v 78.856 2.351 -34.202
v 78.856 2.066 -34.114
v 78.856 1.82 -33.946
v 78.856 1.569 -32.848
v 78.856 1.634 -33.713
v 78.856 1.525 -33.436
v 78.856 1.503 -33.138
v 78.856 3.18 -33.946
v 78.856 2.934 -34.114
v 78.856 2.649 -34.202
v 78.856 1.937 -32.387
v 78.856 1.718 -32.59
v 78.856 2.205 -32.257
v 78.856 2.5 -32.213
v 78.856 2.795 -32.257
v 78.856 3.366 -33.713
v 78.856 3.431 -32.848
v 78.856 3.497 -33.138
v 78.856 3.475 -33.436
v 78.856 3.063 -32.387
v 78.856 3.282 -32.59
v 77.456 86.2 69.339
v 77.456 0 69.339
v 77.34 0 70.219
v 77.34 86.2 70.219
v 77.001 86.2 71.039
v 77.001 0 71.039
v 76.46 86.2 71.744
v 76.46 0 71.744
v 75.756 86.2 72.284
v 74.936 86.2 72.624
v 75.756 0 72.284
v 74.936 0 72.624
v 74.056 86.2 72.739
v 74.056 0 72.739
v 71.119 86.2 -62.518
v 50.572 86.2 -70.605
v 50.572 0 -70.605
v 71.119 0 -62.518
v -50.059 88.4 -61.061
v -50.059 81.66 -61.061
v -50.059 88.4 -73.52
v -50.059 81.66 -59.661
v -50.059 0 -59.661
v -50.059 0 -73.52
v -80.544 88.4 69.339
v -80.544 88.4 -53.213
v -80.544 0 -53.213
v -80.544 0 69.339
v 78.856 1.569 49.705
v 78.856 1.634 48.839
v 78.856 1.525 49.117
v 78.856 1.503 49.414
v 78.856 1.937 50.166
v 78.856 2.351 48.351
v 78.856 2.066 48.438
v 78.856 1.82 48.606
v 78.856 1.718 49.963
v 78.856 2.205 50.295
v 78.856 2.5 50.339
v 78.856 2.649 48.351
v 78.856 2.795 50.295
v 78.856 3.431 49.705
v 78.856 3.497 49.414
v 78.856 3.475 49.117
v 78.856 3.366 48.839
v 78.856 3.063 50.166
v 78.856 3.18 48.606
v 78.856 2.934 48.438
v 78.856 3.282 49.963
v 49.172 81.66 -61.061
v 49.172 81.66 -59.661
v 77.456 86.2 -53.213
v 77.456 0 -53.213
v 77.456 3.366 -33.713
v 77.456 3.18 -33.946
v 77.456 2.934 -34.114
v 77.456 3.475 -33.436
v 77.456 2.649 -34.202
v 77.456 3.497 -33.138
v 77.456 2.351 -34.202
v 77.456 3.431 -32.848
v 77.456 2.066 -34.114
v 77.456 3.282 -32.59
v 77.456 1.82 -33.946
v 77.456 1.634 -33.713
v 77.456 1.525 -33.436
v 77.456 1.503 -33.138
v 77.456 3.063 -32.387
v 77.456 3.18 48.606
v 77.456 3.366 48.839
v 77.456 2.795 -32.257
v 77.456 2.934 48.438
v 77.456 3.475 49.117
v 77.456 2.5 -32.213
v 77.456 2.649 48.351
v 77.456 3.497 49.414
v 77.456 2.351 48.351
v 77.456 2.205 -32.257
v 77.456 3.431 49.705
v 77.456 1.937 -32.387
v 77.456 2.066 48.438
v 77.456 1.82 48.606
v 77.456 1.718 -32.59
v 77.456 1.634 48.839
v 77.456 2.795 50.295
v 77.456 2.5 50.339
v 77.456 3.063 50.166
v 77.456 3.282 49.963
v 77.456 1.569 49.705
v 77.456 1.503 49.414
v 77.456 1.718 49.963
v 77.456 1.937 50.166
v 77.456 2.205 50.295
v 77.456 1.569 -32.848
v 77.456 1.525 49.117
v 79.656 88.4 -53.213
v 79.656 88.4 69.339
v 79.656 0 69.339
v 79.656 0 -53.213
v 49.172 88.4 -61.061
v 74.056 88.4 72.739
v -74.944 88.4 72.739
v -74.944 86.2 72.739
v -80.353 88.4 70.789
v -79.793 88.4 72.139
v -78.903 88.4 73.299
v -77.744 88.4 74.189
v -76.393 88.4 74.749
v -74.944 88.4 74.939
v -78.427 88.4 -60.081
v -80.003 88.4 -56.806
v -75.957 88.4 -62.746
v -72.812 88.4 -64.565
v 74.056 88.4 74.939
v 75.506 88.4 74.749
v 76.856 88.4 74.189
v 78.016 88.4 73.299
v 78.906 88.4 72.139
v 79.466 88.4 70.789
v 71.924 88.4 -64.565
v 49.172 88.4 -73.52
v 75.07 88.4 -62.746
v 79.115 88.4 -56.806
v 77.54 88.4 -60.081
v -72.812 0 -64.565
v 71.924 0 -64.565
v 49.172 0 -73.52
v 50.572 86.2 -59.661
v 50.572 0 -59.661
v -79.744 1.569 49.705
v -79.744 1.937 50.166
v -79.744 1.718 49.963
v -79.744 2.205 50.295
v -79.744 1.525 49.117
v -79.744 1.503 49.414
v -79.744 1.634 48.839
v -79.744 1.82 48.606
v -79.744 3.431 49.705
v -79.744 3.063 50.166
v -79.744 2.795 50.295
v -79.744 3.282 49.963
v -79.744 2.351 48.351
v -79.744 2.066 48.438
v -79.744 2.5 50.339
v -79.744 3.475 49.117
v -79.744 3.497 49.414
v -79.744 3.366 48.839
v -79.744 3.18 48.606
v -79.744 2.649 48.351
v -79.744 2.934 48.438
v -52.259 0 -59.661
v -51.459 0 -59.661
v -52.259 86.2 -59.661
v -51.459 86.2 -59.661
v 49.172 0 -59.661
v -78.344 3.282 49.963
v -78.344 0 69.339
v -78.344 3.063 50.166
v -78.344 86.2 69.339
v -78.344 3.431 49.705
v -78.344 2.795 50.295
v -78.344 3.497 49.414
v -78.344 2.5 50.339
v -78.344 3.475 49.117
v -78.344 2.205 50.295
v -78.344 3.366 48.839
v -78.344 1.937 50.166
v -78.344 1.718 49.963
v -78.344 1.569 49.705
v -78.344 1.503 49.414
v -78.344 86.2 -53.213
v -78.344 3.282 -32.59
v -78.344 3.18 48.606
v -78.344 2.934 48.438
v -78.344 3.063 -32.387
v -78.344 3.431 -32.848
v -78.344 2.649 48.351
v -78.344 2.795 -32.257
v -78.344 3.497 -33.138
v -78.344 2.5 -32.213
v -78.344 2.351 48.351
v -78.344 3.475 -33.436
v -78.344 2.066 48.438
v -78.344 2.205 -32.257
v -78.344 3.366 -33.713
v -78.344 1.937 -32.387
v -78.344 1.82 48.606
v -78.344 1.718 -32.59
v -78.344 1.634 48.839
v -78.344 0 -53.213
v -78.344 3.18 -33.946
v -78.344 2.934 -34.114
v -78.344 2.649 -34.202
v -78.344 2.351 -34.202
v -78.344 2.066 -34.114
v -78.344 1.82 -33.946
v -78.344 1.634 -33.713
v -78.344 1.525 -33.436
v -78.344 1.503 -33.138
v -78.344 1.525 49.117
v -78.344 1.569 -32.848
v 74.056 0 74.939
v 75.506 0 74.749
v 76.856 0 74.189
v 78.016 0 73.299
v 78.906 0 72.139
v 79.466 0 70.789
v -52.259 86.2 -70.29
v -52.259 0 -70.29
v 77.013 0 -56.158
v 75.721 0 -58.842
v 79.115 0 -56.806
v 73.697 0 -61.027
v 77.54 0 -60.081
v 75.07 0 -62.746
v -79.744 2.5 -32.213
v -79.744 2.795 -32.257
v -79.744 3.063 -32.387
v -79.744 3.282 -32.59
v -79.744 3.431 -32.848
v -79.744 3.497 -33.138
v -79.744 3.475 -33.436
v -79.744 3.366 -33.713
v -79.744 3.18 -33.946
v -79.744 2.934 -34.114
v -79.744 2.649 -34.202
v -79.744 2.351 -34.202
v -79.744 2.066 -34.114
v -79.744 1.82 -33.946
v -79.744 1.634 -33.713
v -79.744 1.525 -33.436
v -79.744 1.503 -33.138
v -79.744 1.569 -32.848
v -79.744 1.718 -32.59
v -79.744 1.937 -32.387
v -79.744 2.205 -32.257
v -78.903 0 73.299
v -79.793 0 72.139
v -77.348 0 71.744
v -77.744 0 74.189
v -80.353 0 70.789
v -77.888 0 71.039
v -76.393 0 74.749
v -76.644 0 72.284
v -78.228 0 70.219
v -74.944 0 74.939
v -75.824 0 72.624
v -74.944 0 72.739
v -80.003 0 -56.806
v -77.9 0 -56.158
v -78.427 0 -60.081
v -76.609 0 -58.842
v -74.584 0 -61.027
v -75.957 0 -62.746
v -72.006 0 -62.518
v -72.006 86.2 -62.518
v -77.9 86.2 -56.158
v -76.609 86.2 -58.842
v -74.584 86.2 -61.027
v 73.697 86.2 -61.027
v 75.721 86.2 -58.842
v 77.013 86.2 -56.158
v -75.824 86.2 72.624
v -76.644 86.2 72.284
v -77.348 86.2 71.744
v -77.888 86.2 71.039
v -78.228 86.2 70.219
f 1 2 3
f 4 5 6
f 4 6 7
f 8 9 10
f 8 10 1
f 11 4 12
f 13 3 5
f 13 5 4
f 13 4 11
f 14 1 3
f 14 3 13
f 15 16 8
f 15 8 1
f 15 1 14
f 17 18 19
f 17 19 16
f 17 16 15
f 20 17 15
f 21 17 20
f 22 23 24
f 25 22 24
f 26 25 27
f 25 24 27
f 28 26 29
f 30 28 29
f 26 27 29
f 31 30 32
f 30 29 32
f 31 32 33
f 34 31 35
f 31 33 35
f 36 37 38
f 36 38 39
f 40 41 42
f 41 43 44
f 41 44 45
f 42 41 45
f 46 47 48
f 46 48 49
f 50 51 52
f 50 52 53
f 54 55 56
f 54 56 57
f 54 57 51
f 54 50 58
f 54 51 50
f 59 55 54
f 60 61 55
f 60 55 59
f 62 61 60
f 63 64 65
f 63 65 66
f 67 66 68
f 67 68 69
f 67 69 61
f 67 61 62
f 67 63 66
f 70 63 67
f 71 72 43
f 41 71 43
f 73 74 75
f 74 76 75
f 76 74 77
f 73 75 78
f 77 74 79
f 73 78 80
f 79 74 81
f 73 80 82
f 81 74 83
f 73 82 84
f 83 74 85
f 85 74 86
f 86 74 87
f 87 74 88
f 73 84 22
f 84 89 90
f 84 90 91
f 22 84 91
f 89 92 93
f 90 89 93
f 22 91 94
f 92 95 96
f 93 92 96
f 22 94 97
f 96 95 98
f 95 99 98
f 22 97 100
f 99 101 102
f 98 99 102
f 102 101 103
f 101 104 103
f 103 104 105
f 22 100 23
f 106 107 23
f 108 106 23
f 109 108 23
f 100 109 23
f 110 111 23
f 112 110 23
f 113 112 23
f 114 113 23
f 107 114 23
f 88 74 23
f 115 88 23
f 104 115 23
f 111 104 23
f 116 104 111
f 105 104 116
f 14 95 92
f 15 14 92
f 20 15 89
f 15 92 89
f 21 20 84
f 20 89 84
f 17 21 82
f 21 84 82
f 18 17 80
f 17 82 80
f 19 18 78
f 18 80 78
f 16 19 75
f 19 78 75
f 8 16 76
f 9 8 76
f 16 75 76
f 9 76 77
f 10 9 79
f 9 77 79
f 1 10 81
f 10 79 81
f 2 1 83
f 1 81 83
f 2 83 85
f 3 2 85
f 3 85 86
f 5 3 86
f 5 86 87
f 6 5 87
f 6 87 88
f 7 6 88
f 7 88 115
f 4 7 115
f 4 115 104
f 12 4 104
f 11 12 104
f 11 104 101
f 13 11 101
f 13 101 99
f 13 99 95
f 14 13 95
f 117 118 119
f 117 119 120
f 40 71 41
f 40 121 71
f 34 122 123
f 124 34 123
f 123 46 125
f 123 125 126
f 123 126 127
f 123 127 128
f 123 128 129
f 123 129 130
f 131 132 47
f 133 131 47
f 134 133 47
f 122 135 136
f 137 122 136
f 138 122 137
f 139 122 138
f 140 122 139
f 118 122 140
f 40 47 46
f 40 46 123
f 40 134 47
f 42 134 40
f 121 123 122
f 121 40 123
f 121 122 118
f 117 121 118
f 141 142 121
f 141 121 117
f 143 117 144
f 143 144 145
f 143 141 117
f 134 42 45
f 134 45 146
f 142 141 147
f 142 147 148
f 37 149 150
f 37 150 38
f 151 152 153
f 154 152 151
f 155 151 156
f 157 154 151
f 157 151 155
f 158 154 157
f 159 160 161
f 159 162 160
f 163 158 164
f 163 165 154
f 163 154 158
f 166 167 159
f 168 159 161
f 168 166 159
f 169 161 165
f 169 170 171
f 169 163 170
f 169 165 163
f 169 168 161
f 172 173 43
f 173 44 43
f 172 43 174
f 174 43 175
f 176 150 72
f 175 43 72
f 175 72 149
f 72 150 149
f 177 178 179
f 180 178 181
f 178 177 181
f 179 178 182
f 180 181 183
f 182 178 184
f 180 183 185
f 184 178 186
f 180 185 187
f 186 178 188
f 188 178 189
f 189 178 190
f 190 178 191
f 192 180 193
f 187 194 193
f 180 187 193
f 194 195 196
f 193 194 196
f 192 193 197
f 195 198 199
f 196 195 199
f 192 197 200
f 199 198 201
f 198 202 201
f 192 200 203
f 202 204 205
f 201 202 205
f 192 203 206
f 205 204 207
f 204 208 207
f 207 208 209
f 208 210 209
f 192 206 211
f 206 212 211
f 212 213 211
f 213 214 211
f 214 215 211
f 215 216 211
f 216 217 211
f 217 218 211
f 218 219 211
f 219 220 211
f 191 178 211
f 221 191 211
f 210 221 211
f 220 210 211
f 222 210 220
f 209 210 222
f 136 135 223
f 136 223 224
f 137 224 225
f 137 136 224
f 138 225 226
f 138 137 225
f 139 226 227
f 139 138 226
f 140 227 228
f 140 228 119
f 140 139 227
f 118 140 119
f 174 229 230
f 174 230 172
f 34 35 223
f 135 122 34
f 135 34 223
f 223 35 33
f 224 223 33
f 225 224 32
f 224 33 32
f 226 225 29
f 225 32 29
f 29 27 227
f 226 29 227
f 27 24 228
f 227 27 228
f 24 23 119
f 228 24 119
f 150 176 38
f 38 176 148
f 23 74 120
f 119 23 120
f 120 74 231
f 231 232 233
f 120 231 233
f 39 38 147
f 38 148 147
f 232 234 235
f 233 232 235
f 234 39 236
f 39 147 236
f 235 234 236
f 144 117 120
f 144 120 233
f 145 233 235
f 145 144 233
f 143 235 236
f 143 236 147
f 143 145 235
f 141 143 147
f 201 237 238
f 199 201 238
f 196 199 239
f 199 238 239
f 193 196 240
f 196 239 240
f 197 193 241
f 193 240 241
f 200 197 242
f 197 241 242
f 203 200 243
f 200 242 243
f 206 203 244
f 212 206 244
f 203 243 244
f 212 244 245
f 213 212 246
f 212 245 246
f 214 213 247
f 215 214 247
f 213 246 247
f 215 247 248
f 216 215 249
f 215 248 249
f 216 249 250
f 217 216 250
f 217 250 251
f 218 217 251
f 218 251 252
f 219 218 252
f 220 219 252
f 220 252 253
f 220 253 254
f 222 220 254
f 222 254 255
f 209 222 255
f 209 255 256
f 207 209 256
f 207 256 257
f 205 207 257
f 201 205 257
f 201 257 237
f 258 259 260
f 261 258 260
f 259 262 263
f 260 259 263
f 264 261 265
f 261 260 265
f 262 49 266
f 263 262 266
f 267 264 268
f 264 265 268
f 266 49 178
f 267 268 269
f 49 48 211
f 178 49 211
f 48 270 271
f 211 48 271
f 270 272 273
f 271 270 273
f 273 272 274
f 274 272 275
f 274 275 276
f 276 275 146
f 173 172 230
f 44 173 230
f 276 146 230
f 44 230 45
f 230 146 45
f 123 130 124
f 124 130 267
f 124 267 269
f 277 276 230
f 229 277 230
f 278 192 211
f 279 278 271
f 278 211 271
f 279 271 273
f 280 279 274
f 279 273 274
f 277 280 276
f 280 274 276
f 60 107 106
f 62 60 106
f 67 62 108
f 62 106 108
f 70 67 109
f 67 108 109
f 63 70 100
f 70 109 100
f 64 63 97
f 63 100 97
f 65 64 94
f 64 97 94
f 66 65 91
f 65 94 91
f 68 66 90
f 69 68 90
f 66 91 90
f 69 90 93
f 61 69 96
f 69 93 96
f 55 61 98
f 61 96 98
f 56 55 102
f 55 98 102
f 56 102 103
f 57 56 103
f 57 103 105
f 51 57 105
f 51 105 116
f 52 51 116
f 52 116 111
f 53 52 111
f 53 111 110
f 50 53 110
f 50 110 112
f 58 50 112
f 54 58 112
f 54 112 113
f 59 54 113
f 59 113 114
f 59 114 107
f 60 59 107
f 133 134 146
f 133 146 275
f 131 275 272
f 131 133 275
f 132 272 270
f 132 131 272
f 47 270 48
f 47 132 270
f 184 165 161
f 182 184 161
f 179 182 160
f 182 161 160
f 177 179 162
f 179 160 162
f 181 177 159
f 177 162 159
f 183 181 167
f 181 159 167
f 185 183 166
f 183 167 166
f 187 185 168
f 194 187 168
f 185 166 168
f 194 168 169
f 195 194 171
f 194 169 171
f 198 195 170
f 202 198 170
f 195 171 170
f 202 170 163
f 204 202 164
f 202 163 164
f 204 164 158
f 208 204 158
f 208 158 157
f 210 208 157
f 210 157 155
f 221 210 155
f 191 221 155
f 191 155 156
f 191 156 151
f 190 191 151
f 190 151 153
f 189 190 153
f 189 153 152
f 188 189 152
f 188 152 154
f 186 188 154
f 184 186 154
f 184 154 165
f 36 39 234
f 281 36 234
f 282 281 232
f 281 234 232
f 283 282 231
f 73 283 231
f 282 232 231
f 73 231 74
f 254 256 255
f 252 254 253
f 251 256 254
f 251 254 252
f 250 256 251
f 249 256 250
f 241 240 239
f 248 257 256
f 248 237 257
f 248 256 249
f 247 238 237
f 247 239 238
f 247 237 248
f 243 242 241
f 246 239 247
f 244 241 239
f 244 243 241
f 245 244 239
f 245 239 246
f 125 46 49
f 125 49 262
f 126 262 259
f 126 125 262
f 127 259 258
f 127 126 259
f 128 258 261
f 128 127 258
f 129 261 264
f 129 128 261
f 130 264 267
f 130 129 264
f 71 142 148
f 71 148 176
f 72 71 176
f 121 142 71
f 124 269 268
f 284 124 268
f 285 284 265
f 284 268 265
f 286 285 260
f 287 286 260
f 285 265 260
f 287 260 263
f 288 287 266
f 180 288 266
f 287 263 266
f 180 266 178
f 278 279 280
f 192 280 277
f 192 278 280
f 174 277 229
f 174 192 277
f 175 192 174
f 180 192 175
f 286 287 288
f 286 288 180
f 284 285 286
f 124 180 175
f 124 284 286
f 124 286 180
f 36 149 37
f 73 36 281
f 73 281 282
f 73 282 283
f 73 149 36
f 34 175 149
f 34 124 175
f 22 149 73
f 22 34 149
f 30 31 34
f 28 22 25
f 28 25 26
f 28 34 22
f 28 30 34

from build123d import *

# Parameters (mm, degrees)
BOSS_EXTRUDE2_DEPTH  = 82
BOSS_EXTRUDE3_DEPTH  = 1.5
SKETCH4_W            = 149
SKETCH4_H            = 82
CUT_EXTRUDE2_DEPTH   = 1.5
SKETCH5_W            = 99.231457505
SKETCH5_H            = 0.2
CUT_EXTRUDE3_DEPTH   = 18
SKETCH6_R            = 1
CUT_EXTRUDE4_DEPTH   = 243
CUT_EXTRUDE5_DEPTH   = 16.4
BOSS_EXTRUDE4_DEPTH  = 5
BOSS_EXTRUDE6_DEPTH  = 1.4
SKETCH10_W           = 99.231457505
SKETCH10_H           = 5.34
SKETCH10_H_2         = 1.4
BOSS_EXTRUDE7_DEPTH  = 1.4
BOSS_EXTRUDE8_DEPTH  = 88.4
BOSS_EXTRUDE9_DEPTH  = 0.8
SKETCH13_W           = 10.944457325
SKETCH13_H           = 86.2
BOSS_EXTRUDE10_DEPTH = 0.8


with BuildPart() as part:
    # Sketch1 → Boss-Extrude2 (new body)
    with BuildSketch(Plane(origin=(0, 0, 0), x_dir=(1, 0, 0), z_dir=(0, 1, 0))):
        with BuildLine():
            Line((-0.443676805, -72.739461341), (-0.443676805, -74.139461341))
            Line((-0.443676805, -74.139461341), (74.056323195, -74.139461341))
            ThreePointArc((74.056323195, -74.139461341), (77.450435745, -72.733573891), (78.856323195, -69.339461341))
            Line((78.856323195, -69.339461341), (78.856323195, -3.839461341))
            Line((78.856323195, -3.839461341), (78.856323195, 53.213038835))
            ThreePointArc((78.856323195, 53.213038835), (76.87852757, 59.630364191), (71.631399559, 63.820995158))
            Line((71.631399559, 63.820995158), (49.172051948, 72.660538659))
            Line((49.172051948, 72.660538659), (49.172051948, 71.156007577))
            Line((49.172051948, 71.156007577), (49.172051948, 59.660538659))
            Line((49.172051948, 59.660538659), (50.572051948, 59.660538659))
            Line((50.572051948, 59.660538659), (50.572051948, 70.604995984))
            Line((50.572051948, 70.604995984), (71.118670883, 62.51826368))
            ThreePointArc((71.118670883, 62.51826368), (75.721414752, 58.842271604), (77.456323195, 53.213038835))
            Line((77.456323195, 53.213038835), (77.456323195, -3.839461341))
            Line((77.456323195, -3.839461341), (77.456323195, -69.339461341))
            ThreePointArc((77.456323195, -69.339461341), (76.460486251, -71.743624398), (74.056323195, -72.739461341))
            Line((74.056323195, -72.739461341), (-0.443676805, -72.739461341))
        make_face()
        with BuildLine():
            Line((-74.943676805, -74.139461341), (-0.443676805, -74.139461341))
            Line((-0.443676805, -74.139461341), (-0.443676805, -72.739461341))
            Line((-0.443676805, -72.739461341), (-74.943676805, -72.739461341))
            ThreePointArc((-74.943676805, -72.739461341), (-77.347839861, -71.743624398), (-78.343676805, -69.339461341))
            Line((-78.343676805, -69.339461341), (-78.343676805, -3.839461341))
            Line((-78.343676805, -3.839461341), (-78.343676805, 53.213038835))
            ThreePointArc((-78.343676805, 53.213038835), (-76.608768361, 58.842271604), (-72.006024493, 62.51826368))
            Line((-72.006024493, 62.51826368), (-51.459405557, 70.604995984))
            Line((-51.459405557, 70.604995984), (-51.459405557, 59.660538659))
            Line((-51.459405557, 59.660538659), (-50.059405557, 59.660538659))
            Line((-50.059405557, 59.660538659), (-50.059405557, 71.156007577))
            Line((-50.059405557, 71.156007577), (-50.059405557, 72.660538659))
            Line((-50.059405557, 72.660538659), (-72.518753169, 63.820995158))
            ThreePointArc((-72.518753169, 63.820995158), (-77.765881179, 59.630364191), (-79.743676805, 53.213038835))
            Line((-79.743676805, 53.213038835), (-79.743676805, -3.839461341))
            Line((-79.743676805, -3.839461341), (-79.743676805, -69.339461341))
            ThreePointArc((-79.743676805, -69.339461341), (-78.337789355, -72.733573891), (-74.943676805, -74.139461341))
        make_face()
    extrude(amount=BOSS_EXTRUDE2_DEPTH)

    # Sketch3 → Boss-Extrude3 (add)
    with BuildSketch(Plane(origin=(0, 82, 0), x_dir=(1, 0, 0), z_dir=(0, 1, 0))):
        with BuildLine():
            Line((-50.059405557, 59.660538659), (49.172051948, 59.660538659))
            Line((49.172051948, 59.660538659), (50.572051948, 59.660538659))
            Line((50.572051948, 59.660538659), (50.572051948, 70.604995984))
            Line((50.572051948, 70.604995984), (71.118670883, 62.51826368))
            ThreePointArc((71.118670883, 62.51826368), (75.721414752, 58.842271604), (77.456323195, 53.213038835))
            Line((77.456323195, 53.213038835), (77.456323195, -69.339461341))
            ThreePointArc((77.456323195, -69.339461341), (76.460486251, -71.743624398), (74.056323195, -72.739461341))
            Line((74.056323195, -72.739461341), (-74.943676805, -72.739461341))
            ThreePointArc((-74.943676805, -72.739461341), (-77.347839861, -71.743624398), (-78.343676805, -69.339461341))
            Line((-78.343676805, -69.339461341), (-78.343676805, 53.213038835))
            ThreePointArc((-78.343676805, 53.213038835), (-76.608768361, 58.842271604), (-72.006024493, 62.51826368))
            Line((-72.006024493, 62.51826368), (-51.459405557, 70.604995984))
            Line((-51.459405557, 70.604995984), (-51.459405557, 59.660538659))
            Line((-51.459405557, 59.660538659), (-50.059405557, 59.660538659))
        make_face()
    extrude(amount=-BOSS_EXTRUDE3_DEPTH)

    # Sketch4 → Cut-Extrude2 (cut)
    with BuildSketch(Plane.XY.offset(74.139461341)):
        with Locations((-0.443676805, 41)):
            Rectangle(SKETCH4_W, SKETCH4_H)
    extrude(amount=-CUT_EXTRUDE2_DEPTH, mode=Mode.SUBTRACT)

    # Sketch5 → Cut-Extrude3 (cut)
    with BuildSketch(Plane(origin=(0, 82, 0), x_dir=(1, 0, 0), z_dir=(0, 1, 0))):
        with Locations((-0.443676805, 59.560538659)):
            Rectangle(SKETCH5_W, SKETCH5_H)
    extrude(amount=-CUT_EXTRUDE3_DEPTH, mode=Mode.SUBTRACT)

    # Sketch6 → Cut-Extrude4 (cut)
    with BuildSketch(Plane.ZY.offset(79.743676805)):
        with Locations((-33.213038835, 2.5)):
            Circle(SKETCH6_R)
        with Locations((49.339461341, 2.5)):
            Circle(SKETCH6_R)
    extrude(amount=-CUT_EXTRUDE4_DEPTH, mode=Mode.SUBTRACT)

    # Sketch7 → Cut-Extrude5 (cut)
    with BuildSketch(Plane.XZ.offset(-80.5)):
        with BuildLine():
            Line((-50.059405557, -59.460538659), (49.172051948, -59.460538659))
            Line((49.172051948, -59.460538659), (49.172051948, -59.660538659))
            Line((49.172051948, -59.660538659), (50.572051948, -59.660538659))
            Line((50.572051948, -59.660538659), (50.572051948, -70.604995984))
            Line((50.572051948, -70.604995984), (71.118670883, -62.51826368))
            ThreePointArc((71.118670883, -62.51826368), (75.721414752, -58.842271604), (77.456323195, -53.213038835))
            Line((77.456323195, -53.213038835), (77.456323195, 69.339461341))
            ThreePointArc((77.456323195, 69.339461341), (76.460486251, 71.743624398), (74.056323195, 72.739461341))
            Line((74.056323195, 72.739461341), (74.056323195, 72.639461341))
            Line((74.056323195, 72.639461341), (-74.943676805, 72.639461341))
            Line((-74.943676805, 72.639461341), (-74.943676805, 72.739461341))
            ThreePointArc((-74.943676805, 72.739461341), (-77.347839861, 71.743624398), (-78.343676805, 69.339461341))
            Line((-78.343676805, 69.339461341), (-78.343676805, -53.213038835))
            ThreePointArc((-78.343676805, -53.213038835), (-76.608768361, -58.842271604), (-72.006024493, -62.51826368))
            Line((-72.006024493, -62.51826368), (-51.459405557, -70.604995984))
            Line((-51.459405557, -70.604995984), (-51.459405557, -59.660538659))
            Line((-51.459405557, -59.660538659), (-50.059405557, -59.660538659))
            Line((-50.059405557, -59.660538659), (-50.059405557, -59.460538659))
        make_face()
    extrude(amount=-CUT_EXTRUDE5_DEPTH, mode=Mode.SUBTRACT)

    # Sketch8 → Boss-Extrude4 (add)
    with BuildSketch(Plane(origin=(0, 82, 0), x_dir=(1, 0, 0), z_dir=(0, 1, 0))):
        with BuildLine():
            Line((74.056323195, -72.739461341), (74.056323195, -74.139461341))
            ThreePointArc((74.056323195, -74.139461341), (77.450435745, -72.733573891), (78.856323195, -69.339461341))
            Line((78.856323195, -69.339461341), (78.856323195, 53.213038835))
            ThreePointArc((78.856323195, 53.213038835), (76.87852757, 59.630364191), (71.631399559, 63.820995158))
            Line((71.631399559, 63.820995158), (49.172051948, 72.660538659))
            Line((49.172051948, 72.660538659), (49.172051948, 59.660538659))
            Line((49.172051948, 59.660538659), (50.572051948, 59.660538659))
            Line((50.572051948, 59.660538659), (50.572051948, 70.604995984))
            Line((50.572051948, 70.604995984), (71.118670883, 62.51826368))
            ThreePointArc((71.118670883, 62.51826368), (75.721414752, 58.842271604), (77.456323195, 53.213038835))
            Line((77.456323195, 53.213038835), (77.456323195, -69.339461341))
            ThreePointArc((77.456323195, -69.339461341), (76.460486251, -71.743624398), (74.056323195, -72.739461341))
        make_face()
        with BuildLine():
            Line((-51.459405557, 59.660538659), (-50.059405557, 59.660538659))
            Line((-50.059405557, 59.660538659), (-50.059405557, 72.660538659))
            Line((-50.059405557, 72.660538659), (-72.518753169, 63.820995158))
            ThreePointArc((-72.518753169, 63.820995158), (-77.765881179, 59.630364191), (-79.743676805, 53.213038835))
            Line((-79.743676805, 53.213038835), (-79.743676805, -69.339461341))
            ThreePointArc((-79.743676805, -69.339461341), (-78.337789355, -72.733573891), (-74.943676805, -74.139461341))
            Line((-74.943676805, -74.139461341), (-74.943676805, -72.739461341))
            ThreePointArc((-74.943676805, -72.739461341), (-77.347839861, -71.743624398), (-78.343676805, -69.339461341))
            Line((-78.343676805, -69.339461341), (-78.343676805, 53.213038835))
            ThreePointArc((-78.343676805, 53.213038835), (-76.608768361, 58.842271604), (-72.006024493, 62.51826368))
            Line((-72.006024493, 62.51826368), (-51.459405557, 70.604995984))
            Line((-51.459405557, 70.604995984), (-51.459405557, 59.660538659))
        make_face()
    extrude(amount=BOSS_EXTRUDE4_DEPTH)

    # Sketch9 → Boss-Extrude6 (add)
    with BuildSketch(Plane(origin=(0, 87, 0), x_dir=(1, 0, 0), z_dir=(0, 1, 0))):
        with BuildLine():
            Line((77.456323195, 53.213038835), (77.456323195, -69.339461341))
            ThreePointArc((77.456323195, -69.339461341), (76.460486251, -71.743624398), (74.056323195, -72.739461341))
            Line((74.056323195, -72.739461341), (-74.943676805, -72.739461341))
            ThreePointArc((-74.943676805, -72.739461341), (-77.347839861, -71.743624398), (-78.343676805, -69.339461341))
            Line((-78.343676805, -69.339461341), (-78.343676805, 53.213038835))
            ThreePointArc((-78.343676805, 53.213038835), (-76.608768361, 58.842271604), (-72.006024493, 62.51826368))
            Line((-72.006024493, 62.51826368), (-51.459405557, 70.604995984))
            Line((-51.459405557, 70.604995984), (-51.459405557, 59.660538659))
            Line((-51.459405557, 59.660538659), (-50.059405557, 59.660538659))
            Line((-50.059405557, 59.660538659), (49.172051948, 59.660538659))
            Line((49.172051948, 59.660538659), (50.572051948, 59.660538659))
            Line((50.572051948, 59.660538659), (50.572051948, 70.604995984))
            Line((50.572051948, 70.604995984), (71.118670883, 62.51826368))
            ThreePointArc((71.118670883, 62.51826368), (75.721414752, 58.842271604), (77.456323195, 53.213038835))
        make_face()
        with BuildLine():
            Line((-72.006024493, 62.51826368), (-51.459405557, 70.604995984))
            Line((-51.459405557, 70.604995984), (-51.459405557, 59.660538659))
            Line((-51.459405557, 59.660538659), (-50.059405557, 59.660538659))
            Line((-50.059405557, 59.660538659), (-50.059405557, 72.660538659))
            Line((-50.059405557, 72.660538659), (-72.518753169, 63.820995158))
            ThreePointArc((-72.518753169, 63.820995158), (-77.765881179, 59.630364191), (-79.743676805, 53.213038835))
            Line((-79.743676805, 53.213038835), (-79.743676805, -69.339461341))
            ThreePointArc((-79.743676805, -69.339461341), (-78.337789355, -72.733573891), (-74.943676805, -74.139461341))
            Line((-74.943676805, -74.139461341), (-74.943676805, -72.739461341))
            ThreePointArc((-74.943676805, -72.739461341), (-77.347839861, -71.743624398), (-78.343676805, -69.339461341))
            Line((-78.343676805, -69.339461341), (-78.343676805, 53.213038835))
            ThreePointArc((-78.343676805, 53.213038835), (-76.608768361, 58.842271604), (-72.006024493, 62.51826368))
        make_face()
        with BuildLine():
            ThreePointArc((77.456323195, 53.213038835), (75.721414752, 58.842271604), (71.118670883, 62.51826368))
            Line((71.118670883, 62.51826368), (50.572051948, 70.604995984))
            Line((50.572051948, 70.604995984), (50.572051948, 59.660538659))
            Line((50.572051948, 59.660538659), (49.172051948, 59.660538659))
            Line((49.172051948, 59.660538659), (49.172051948, 72.660538659))
            Line((49.172051948, 72.660538659), (71.631399559, 63.820995158))
            ThreePointArc((71.631399559, 63.820995158), (76.87852757, 59.630364191), (78.856323195, 53.213038835))
            Line((78.856323195, 53.213038835), (78.856323195, -69.339461341))
            ThreePointArc((78.856323195, -69.339461341), (77.450435745, -72.733573891), (74.056323195, -74.139461341))
            Line((74.056323195, -74.139461341), (74.056323195, -72.739461341))
            ThreePointArc((74.056323195, -72.739461341), (76.460486251, -71.743624398), (77.456323195, -69.339461341))
            Line((77.456323195, -69.339461341), (77.456323195, 53.213038835))
        make_face()
    extrude(amount=BOSS_EXTRUDE6_DEPTH)

    # Sketch10 → Boss-Extrude7 (add)
    with BuildSketch(Plane(origin=(0, 0, -59.660538659), x_dir=(-1, 0, 0), z_dir=(0, 0, -1))):
        with Locations((0.443676805, 84.33)):
            Rectangle(SKETCH10_W, SKETCH10_H)
        with Locations((0.443676805, 87.7)):
            Rectangle(SKETCH10_W, SKETCH10_H_2)
    extrude(amount=BOSS_EXTRUDE7_DEPTH)

    # Sketch11 → Boss-Extrude8 (add)
    with BuildSketch(Plane(origin=(0, 88.4, 0), x_dir=(1, 0, 0), z_dir=(0, 1, 0))):
        with BuildLine():
            Line((71.924387374, 64.565413146), (49.172051948, 73.520270705))
            Line((49.172051948, 73.520270705), (49.172051948, 72.660538659))
            Line((49.172051948, 72.660538659), (71.631399559, 63.820995158))
            ThreePointArc((71.631399559, 63.820995158), (76.87852757, 59.630364191), (78.856323195, 53.213038835))
            Line((78.856323195, 53.213038835), (78.856323195, -69.339461341))
            ThreePointArc((78.856323195, -69.339461341), (77.450435745, -72.733573891), (74.056323195, -74.139461341))
            Line((74.056323195, -74.139461341), (74.056323195, -74.939461341))
            ThreePointArc((74.056323195, -74.939461341), (78.01612117, -73.299259316), (79.656323195, -69.339461341))
            Line((79.656323195, -69.339461341), (79.656323195, 53.213038835))
            ThreePointArc((79.656323195, 53.213038835), (77.539734894, 60.080702813), (71.924387374, 64.565413146))
        make_face()
        with BuildLine():
            Line((-50.059405557, 72.660538659), (-50.059405557, 73.520270705))
            Line((-50.059405557, 73.520270705), (-72.811740984, 64.565413146))
            ThreePointArc((-72.811740984, 64.565413146), (-78.427088504, 60.080702813), (-80.543676805, 53.213038835))
            Line((-80.543676805, 53.213038835), (-80.543676805, -69.339461341))
            ThreePointArc((-80.543676805, -69.339461341), (-78.90347478, -73.299259316), (-74.943676805, -74.939461341))
            Line((-74.943676805, -74.939461341), (-74.943676805, -74.139461341))
            ThreePointArc((-74.943676805, -74.139461341), (-78.337789355, -72.733573891), (-79.743676805, -69.339461341))
            Line((-79.743676805, -69.339461341), (-79.743676805, 53.213038835))
            ThreePointArc((-79.743676805, 53.213038835), (-77.765881179, 59.630364191), (-72.518753169, 63.820995158))
            Line((-72.518753169, 63.820995158), (-50.059405557, 72.660538659))
        make_face()
    extrude(amount=-BOSS_EXTRUDE8_DEPTH)

    # Sketch12 → Boss-Extrude9 (add)
    with BuildSketch(Plane.XZ.offset(-87)):
        with BuildLine():
            Line((-51.459405557, -59.660538659), (50.572051948, -59.660538659))
            Line((50.572051948, -59.660538659), (50.572051948, -70.604995984))
            Line((50.572051948, -70.604995984), (71.118670883, -62.51826368))
            ThreePointArc((71.118670883, -62.51826368), (75.721414752, -58.842271604), (77.456323195, -53.213038835))
            Line((77.456323195, -53.213038835), (77.456323195, 69.339461341))
            ThreePointArc((77.456323195, 69.339461341), (76.460486251, 71.743624398), (74.056323195, 72.739461341))
            Line((74.056323195, 72.739461341), (-74.943676805, 72.739461341))
            ThreePointArc((-74.943676805, 72.739461341), (-77.347839861, 71.743624398), (-78.343676805, 69.339461341))
            Line((-78.343676805, 69.339461341), (-78.343676805, -53.213038835))
            ThreePointArc((-78.343676805, -53.213038835), (-76.608768361, -58.842271604), (-72.006024493, -62.51826368))
            Line((-72.006024493, -62.51826368), (-51.459405557, -70.604995984))
            Line((-51.459405557, -70.604995984), (-51.459405557, -59.660538659))
        make_face()
    extrude(amount=BOSS_EXTRUDE9_DEPTH)

    # Sketch13 → Boss-Extrude10 (add)
    with BuildSketch(Plane.ZY.offset(51.459405557)):
        with Locations((-65.132767321, 43.1)):
            Rectangle(SKETCH13_W, SKETCH13_H)
    extrude(amount=BOSS_EXTRUDE10_DEPTH)


solid = part.part
